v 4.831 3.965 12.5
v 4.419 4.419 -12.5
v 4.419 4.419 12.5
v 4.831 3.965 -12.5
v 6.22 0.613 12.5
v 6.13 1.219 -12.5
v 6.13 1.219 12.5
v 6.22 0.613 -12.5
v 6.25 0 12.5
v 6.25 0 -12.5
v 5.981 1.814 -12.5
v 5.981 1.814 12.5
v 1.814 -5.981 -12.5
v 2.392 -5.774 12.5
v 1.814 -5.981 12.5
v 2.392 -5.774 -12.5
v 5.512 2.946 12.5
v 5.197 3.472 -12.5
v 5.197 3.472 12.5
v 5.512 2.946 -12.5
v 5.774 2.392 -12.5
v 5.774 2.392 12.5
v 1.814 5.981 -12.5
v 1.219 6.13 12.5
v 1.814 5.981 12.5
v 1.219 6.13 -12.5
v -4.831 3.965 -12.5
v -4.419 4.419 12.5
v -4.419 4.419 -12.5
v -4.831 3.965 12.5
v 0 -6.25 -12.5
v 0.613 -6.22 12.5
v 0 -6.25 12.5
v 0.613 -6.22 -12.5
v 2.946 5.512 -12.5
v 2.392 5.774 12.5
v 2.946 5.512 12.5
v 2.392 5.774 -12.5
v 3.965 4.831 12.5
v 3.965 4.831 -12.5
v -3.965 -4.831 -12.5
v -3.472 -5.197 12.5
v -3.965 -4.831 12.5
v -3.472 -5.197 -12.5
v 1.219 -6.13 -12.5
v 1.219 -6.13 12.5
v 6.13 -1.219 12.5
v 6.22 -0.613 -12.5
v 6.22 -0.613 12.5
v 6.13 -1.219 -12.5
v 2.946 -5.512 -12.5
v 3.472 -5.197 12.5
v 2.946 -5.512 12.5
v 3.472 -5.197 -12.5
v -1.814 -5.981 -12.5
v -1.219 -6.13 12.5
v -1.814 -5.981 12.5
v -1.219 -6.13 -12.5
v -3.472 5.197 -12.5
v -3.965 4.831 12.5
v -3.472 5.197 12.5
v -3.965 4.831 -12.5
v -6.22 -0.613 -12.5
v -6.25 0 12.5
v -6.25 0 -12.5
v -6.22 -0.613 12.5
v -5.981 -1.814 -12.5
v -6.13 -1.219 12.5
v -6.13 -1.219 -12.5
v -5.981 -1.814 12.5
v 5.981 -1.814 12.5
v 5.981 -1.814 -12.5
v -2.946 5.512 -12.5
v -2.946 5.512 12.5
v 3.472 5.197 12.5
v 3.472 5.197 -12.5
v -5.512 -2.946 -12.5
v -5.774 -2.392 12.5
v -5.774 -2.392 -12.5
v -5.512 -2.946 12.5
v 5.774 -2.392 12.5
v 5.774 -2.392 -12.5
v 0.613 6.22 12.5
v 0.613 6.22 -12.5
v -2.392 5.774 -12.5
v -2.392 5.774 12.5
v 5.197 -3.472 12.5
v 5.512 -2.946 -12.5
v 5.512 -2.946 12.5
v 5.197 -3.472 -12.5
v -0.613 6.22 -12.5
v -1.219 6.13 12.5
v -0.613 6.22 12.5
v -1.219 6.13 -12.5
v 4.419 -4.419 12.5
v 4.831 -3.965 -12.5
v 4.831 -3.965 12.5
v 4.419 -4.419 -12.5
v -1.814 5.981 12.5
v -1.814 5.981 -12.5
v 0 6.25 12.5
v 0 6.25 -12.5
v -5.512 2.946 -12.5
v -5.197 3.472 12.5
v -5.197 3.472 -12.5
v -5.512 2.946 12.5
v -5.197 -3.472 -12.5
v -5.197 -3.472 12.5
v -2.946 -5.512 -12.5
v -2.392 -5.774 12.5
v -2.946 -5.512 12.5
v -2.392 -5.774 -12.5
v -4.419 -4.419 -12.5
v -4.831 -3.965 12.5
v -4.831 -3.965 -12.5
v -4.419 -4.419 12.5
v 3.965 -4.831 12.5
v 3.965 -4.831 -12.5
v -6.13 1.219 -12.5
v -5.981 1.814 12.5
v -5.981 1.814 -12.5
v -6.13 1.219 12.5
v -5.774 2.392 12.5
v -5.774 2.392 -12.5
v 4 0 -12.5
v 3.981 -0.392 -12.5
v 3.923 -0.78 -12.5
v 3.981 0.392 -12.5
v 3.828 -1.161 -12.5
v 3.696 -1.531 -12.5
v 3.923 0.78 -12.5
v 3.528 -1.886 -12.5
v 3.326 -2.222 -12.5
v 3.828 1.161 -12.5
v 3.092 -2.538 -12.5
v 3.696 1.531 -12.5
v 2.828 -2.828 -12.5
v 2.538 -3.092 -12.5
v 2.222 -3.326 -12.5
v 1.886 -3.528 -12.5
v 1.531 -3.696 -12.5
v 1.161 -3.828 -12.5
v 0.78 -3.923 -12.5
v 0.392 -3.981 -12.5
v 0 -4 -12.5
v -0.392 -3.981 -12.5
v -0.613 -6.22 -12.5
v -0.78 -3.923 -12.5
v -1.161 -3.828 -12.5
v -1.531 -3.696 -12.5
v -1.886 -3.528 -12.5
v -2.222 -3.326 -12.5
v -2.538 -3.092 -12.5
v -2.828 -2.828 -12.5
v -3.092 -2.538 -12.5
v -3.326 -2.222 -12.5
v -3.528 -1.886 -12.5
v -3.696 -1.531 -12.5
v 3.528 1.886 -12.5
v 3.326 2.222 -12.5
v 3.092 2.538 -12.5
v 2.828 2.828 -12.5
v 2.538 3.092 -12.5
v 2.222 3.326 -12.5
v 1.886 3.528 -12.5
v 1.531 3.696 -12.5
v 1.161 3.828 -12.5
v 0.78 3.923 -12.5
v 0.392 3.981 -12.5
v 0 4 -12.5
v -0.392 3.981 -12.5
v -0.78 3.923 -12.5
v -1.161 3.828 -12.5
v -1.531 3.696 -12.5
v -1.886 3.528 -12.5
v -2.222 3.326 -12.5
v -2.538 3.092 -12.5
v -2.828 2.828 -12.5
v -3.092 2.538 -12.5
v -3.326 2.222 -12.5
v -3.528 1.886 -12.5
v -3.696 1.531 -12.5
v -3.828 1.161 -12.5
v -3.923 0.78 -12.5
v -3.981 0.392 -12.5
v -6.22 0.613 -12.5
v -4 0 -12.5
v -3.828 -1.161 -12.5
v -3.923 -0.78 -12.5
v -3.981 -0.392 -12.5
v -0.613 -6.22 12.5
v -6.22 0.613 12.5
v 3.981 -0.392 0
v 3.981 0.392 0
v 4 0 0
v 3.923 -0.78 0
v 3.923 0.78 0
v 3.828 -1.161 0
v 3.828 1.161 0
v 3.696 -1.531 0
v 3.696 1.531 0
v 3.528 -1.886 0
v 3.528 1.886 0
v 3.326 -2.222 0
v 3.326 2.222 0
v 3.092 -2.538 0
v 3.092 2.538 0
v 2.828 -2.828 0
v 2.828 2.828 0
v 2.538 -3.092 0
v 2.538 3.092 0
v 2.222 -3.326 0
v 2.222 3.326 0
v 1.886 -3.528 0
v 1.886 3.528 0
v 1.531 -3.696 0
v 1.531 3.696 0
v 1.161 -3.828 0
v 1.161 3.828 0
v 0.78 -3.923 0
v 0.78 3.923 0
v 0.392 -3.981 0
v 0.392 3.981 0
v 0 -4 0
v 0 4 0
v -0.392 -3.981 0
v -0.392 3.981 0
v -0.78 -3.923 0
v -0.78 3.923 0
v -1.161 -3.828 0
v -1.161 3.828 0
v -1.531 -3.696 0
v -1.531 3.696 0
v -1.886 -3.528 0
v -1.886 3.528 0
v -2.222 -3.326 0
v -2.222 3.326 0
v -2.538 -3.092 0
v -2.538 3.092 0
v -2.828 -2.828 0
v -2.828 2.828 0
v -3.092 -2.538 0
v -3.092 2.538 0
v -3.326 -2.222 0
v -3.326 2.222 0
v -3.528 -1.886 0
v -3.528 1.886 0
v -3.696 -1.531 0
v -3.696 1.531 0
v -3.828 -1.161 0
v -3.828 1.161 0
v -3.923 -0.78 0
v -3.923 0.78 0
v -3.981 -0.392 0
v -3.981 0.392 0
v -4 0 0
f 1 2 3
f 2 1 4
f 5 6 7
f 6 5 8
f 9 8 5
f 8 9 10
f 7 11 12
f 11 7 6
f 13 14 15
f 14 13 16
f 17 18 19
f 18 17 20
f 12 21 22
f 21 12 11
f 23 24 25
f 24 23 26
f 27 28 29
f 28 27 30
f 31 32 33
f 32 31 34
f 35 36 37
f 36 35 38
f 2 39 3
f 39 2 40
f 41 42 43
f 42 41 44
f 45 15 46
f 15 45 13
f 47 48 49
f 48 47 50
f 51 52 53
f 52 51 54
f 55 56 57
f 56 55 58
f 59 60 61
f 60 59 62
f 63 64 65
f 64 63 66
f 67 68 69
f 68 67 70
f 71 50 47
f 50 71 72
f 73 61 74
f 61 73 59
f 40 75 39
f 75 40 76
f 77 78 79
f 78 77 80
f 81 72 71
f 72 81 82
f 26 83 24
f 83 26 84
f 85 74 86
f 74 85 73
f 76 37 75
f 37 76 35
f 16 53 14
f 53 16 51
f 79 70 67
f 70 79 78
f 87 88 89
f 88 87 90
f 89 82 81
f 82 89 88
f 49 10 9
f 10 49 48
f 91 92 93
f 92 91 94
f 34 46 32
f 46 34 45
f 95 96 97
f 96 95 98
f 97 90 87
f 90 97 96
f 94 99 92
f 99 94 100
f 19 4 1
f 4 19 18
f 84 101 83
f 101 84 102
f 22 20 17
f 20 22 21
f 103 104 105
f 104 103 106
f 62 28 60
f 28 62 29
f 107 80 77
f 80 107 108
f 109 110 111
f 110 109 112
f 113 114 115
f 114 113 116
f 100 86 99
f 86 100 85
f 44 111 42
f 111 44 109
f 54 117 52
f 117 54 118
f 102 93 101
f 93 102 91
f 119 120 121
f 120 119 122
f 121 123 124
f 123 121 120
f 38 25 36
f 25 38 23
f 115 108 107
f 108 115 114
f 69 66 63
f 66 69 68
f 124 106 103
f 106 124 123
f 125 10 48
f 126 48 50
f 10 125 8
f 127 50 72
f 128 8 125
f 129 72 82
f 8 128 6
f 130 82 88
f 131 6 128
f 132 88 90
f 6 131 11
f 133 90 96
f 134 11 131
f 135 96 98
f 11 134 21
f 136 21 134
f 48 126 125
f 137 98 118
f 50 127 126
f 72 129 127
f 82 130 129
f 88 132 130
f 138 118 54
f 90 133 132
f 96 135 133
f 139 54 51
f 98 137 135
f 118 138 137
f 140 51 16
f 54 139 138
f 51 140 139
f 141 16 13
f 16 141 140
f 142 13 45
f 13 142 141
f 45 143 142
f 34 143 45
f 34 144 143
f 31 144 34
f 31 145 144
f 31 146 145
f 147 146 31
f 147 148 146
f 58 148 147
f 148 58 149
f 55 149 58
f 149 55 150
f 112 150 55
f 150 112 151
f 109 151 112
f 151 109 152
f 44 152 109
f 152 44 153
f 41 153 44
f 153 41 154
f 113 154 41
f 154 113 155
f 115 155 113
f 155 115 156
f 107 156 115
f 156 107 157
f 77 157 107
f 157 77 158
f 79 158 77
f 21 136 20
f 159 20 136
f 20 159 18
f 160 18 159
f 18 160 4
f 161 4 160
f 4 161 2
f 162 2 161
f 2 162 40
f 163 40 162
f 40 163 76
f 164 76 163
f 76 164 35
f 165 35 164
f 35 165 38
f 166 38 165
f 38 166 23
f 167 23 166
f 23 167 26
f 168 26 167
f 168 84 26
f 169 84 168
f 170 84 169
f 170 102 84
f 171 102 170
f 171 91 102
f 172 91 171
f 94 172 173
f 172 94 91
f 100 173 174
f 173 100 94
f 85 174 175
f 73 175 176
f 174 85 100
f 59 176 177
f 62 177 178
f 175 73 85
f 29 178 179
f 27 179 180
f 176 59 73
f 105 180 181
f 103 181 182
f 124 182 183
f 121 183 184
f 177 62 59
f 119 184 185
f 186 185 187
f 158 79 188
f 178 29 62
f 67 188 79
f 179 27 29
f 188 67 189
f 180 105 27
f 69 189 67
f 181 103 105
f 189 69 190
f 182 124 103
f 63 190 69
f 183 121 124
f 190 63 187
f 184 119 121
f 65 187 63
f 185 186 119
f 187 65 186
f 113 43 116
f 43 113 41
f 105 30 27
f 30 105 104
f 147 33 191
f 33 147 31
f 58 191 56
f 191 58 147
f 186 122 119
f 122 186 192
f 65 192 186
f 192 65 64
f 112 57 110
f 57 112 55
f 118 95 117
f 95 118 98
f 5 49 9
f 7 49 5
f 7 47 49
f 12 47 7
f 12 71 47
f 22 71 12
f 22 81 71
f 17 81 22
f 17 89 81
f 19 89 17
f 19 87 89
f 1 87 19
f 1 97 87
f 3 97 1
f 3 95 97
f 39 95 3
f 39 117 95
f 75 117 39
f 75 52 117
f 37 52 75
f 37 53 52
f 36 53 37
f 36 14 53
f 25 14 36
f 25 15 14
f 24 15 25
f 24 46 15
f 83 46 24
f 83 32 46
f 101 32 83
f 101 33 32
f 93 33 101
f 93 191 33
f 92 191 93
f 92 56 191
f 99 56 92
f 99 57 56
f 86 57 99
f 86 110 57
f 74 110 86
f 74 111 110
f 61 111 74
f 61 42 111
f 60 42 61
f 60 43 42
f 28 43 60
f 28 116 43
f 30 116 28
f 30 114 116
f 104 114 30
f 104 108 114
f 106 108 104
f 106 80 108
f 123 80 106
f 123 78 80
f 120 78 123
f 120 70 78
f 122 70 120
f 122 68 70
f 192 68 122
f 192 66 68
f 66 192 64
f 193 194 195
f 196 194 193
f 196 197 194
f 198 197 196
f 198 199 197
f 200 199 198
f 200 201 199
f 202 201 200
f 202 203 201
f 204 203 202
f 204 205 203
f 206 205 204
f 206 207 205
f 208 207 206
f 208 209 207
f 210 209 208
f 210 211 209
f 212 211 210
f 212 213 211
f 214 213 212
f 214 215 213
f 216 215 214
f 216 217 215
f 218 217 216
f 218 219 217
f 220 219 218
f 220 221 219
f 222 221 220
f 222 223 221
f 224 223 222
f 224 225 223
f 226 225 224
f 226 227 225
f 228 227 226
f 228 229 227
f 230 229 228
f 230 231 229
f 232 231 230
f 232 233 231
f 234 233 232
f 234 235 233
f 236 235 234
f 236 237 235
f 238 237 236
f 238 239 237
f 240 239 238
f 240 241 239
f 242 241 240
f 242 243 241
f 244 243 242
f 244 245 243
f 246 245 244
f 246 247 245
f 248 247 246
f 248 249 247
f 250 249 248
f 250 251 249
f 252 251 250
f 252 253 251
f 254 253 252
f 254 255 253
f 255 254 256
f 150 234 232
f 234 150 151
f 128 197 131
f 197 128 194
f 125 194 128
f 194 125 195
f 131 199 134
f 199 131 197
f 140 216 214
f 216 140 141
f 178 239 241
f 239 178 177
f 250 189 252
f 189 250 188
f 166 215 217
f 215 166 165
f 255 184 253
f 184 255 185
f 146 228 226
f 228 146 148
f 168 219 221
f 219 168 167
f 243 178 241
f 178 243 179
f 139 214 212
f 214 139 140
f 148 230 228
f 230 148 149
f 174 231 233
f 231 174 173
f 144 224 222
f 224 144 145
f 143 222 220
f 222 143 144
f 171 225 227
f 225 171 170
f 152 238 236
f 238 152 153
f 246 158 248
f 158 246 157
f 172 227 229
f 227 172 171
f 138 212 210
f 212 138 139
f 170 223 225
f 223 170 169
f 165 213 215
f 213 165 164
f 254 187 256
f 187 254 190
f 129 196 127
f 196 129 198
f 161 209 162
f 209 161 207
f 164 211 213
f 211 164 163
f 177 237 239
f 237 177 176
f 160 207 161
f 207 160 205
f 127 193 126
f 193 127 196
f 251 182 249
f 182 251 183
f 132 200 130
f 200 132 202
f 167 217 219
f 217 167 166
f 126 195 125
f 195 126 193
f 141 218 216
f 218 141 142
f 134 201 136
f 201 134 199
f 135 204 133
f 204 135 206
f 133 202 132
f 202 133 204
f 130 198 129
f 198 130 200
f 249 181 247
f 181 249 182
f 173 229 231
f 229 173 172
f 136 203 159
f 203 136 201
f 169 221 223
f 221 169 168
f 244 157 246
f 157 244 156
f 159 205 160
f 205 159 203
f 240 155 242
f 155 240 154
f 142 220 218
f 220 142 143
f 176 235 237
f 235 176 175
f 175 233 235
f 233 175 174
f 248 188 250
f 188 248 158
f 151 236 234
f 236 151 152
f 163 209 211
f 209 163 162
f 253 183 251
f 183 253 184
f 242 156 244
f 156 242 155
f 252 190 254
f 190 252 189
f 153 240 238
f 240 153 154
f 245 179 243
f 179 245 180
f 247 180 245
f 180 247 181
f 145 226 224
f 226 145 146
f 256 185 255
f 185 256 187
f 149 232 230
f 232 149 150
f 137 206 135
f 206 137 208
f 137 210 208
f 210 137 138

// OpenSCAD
$fn=64;

module shaft_coupling() {
    difference() {
        // Outer cylinder
        cylinder(h=25.0, d=12.5, center=true);
        
        // 5.0mm bore
        translate([0, 0, -12.5])
            cylinder(h=25.0, d=5.0, center=true);
        
        // 8.0mm bore
        translate([0, 0, -12.5])
            cylinder(h=25.0, d=8.0, center=true);
    }
}

shaft_coupling();
